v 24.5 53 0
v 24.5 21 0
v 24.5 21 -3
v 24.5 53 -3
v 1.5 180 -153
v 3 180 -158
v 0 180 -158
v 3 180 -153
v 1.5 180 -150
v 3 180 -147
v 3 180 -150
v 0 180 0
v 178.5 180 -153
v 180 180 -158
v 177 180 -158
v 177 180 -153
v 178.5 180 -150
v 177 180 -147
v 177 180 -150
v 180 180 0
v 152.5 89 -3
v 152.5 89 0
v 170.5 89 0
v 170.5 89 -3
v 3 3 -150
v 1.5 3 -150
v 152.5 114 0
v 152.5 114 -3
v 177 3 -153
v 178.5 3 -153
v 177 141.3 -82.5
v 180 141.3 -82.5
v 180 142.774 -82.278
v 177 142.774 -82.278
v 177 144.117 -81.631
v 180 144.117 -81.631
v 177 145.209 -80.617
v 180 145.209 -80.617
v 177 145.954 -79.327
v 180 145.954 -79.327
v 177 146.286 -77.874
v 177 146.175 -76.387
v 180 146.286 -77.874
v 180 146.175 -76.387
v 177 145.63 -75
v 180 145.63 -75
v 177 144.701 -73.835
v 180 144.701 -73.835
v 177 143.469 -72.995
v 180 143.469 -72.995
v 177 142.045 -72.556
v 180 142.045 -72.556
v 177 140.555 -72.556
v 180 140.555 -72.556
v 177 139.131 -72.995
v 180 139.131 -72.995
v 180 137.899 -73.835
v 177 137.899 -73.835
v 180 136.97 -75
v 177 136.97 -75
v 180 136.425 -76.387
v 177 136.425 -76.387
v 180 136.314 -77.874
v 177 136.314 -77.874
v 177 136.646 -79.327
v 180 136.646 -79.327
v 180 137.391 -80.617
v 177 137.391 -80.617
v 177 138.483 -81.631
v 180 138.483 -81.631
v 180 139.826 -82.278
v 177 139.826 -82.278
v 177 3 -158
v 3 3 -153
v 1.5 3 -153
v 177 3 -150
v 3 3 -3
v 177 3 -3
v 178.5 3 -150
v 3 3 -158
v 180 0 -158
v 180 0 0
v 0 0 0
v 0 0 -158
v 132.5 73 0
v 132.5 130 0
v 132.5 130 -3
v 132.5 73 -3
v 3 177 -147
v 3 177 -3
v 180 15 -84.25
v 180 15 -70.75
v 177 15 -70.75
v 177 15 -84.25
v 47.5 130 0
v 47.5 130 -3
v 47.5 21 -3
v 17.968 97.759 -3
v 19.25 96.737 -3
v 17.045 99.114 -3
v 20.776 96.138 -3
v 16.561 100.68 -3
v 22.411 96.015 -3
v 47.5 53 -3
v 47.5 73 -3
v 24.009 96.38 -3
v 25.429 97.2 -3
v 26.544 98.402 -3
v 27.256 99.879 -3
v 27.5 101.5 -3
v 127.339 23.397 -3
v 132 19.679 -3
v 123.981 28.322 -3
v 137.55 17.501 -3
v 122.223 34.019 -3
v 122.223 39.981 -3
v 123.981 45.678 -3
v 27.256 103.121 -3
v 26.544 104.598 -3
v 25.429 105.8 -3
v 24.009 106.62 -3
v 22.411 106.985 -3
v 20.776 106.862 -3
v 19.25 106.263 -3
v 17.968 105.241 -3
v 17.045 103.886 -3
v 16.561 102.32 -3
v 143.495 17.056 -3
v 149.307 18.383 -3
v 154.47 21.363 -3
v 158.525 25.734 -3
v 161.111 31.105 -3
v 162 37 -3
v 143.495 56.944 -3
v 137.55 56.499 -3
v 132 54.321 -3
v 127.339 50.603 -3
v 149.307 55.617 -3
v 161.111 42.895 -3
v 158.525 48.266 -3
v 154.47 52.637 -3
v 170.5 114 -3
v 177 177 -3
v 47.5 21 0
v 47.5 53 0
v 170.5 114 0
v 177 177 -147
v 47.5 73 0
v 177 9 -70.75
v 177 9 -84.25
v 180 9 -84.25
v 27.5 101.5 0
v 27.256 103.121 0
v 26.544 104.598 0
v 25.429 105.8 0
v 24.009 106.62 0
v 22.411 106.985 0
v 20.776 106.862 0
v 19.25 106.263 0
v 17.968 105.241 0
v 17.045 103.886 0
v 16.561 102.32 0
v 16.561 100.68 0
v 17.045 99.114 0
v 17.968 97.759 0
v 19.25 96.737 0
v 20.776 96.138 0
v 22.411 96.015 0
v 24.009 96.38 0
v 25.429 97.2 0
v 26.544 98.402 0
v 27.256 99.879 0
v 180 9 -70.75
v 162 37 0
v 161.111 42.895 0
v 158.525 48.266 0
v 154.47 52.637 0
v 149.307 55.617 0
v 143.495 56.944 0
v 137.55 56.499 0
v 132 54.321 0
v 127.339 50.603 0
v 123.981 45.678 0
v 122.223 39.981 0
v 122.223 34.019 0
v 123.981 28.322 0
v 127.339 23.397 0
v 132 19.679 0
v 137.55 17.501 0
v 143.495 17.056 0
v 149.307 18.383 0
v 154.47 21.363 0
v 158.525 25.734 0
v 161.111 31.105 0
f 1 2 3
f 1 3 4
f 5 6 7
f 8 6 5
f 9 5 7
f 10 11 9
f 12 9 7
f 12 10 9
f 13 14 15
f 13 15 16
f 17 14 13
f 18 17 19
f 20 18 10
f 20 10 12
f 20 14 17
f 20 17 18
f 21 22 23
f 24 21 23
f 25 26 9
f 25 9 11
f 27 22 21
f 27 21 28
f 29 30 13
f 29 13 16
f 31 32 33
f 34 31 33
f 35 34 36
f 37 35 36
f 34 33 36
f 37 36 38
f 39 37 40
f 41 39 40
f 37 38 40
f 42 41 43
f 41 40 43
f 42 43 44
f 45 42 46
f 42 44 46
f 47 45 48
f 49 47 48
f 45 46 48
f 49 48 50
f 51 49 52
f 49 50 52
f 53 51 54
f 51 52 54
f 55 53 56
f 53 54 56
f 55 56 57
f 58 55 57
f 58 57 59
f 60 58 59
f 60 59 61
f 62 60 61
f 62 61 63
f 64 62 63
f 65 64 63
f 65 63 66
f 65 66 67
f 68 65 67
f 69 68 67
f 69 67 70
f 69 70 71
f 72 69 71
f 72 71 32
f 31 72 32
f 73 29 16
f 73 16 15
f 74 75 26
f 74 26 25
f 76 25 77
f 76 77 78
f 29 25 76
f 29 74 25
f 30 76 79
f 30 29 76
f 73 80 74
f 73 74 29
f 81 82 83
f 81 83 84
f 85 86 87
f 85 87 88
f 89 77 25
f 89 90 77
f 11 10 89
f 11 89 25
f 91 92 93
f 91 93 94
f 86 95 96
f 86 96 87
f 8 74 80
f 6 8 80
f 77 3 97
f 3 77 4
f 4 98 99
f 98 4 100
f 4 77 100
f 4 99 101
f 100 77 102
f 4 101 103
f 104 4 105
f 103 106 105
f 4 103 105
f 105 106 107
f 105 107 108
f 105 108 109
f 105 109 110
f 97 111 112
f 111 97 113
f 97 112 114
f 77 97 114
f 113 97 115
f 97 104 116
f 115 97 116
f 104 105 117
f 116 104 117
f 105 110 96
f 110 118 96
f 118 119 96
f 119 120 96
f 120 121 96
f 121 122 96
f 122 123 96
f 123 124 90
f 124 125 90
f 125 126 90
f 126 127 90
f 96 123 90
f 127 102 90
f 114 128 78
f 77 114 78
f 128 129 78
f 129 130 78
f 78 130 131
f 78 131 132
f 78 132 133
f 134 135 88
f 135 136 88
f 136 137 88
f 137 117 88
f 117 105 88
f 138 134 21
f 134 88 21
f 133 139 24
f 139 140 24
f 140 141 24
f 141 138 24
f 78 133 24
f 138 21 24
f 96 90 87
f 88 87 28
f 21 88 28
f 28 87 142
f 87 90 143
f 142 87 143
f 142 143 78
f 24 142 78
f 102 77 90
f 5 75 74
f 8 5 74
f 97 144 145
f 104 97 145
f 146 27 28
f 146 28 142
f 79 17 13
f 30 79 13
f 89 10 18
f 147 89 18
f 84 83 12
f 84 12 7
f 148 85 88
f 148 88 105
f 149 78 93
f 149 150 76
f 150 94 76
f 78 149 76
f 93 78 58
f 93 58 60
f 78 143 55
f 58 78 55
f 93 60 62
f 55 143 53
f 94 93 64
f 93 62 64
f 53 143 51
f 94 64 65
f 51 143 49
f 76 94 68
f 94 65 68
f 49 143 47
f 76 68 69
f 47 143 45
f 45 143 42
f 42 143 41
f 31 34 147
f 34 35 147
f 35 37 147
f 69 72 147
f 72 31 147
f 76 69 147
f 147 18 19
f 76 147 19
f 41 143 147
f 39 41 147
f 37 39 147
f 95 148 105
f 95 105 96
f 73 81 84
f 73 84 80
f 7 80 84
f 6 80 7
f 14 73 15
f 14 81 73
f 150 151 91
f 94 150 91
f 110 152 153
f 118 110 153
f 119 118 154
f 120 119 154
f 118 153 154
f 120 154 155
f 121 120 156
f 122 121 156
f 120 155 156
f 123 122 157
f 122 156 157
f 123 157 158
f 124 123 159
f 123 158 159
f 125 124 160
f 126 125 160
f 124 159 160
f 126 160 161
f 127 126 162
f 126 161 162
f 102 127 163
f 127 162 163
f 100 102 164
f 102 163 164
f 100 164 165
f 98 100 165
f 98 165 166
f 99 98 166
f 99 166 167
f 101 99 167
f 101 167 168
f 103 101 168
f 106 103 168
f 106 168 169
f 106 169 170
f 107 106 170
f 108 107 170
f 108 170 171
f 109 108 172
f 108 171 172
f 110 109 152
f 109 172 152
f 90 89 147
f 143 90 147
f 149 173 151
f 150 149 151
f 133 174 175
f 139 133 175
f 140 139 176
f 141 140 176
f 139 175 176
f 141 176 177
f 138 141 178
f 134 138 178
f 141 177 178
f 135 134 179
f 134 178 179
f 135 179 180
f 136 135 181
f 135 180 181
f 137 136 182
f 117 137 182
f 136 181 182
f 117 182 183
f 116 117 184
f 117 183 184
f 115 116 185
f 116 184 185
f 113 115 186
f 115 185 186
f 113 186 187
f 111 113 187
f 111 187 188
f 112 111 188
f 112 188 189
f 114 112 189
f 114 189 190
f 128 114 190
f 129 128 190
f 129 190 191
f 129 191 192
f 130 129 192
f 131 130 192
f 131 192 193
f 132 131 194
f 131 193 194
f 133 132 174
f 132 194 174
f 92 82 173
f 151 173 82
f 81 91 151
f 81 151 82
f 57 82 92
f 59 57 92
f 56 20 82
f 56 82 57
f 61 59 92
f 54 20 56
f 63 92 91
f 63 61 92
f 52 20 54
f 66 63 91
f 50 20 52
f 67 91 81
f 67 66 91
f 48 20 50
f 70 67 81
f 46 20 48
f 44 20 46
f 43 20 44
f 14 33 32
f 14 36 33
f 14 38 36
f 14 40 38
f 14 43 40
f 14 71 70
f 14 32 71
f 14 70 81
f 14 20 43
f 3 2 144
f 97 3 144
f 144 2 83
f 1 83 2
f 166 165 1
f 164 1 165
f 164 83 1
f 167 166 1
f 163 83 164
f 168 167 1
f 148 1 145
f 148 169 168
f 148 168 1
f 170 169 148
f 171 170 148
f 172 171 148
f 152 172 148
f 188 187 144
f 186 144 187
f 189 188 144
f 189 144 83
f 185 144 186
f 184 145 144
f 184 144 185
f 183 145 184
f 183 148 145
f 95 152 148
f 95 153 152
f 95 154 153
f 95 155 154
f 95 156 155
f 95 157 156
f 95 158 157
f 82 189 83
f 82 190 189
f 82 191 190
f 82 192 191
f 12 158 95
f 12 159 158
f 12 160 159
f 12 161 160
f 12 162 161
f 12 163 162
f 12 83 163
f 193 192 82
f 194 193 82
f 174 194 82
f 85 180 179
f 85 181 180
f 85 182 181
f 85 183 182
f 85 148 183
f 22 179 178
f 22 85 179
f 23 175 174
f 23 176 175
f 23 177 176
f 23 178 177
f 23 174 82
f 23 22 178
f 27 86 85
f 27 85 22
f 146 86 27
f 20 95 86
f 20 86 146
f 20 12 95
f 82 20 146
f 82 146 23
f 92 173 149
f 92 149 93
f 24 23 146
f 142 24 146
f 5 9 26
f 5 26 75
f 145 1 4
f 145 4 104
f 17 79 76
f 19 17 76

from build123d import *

# Parameters (mm, degrees)
SKETCH2_W           = 23
SKETCH2_H           = 32
SKETCH2_R           = 5.5
SKETCH2_R_2         = 20
SKETCH2_W_2         = 18
SKETCH2_H_2         = 25
BOSS_EXTRUDE1_DEPTH = 3
BOSS_EXTRUDE2_DEPTH = 3
SKETCH4_W           = 180
SKETCH4_H           = 158
BOSS_EXTRUDE3_DEPTH = 3
SKETCH6_W           = 1.5
SKETCH6_H           = 3
CUT_EXTRUDE4_DEPTH  = 177
SKETCH8_W           = 180
SKETCH8_H           = 147
BOSS_EXTRUDE5_DEPTH = 3
SKETCH9_R           = 5
SKETCH9_W           = 13.5
SKETCH9_H           = 6
CUT_EXTRUDE5_DEPTH  = 10


with BuildPart() as part:
    # Sketch2 → Boss-Extrude1 (new body)
    # profile 1 of 2: a face of its own
    with BuildSketch(Plane.XY):
        Polygon((90, 180), (0, 180), (0, 130), (0, 0), (90, 0), (90, 73), (47.5, 73), (47.5, 130), (90, 130), align=None)
        with Locations((36, 37)):
            Rectangle(SKETCH2_W, SKETCH2_H, mode=Mode.SUBTRACT)
        with Locations((22, 101.5)):
            Circle(SKETCH2_R, mode=Mode.SUBTRACT)
    # profile 2 of 2: a face of its own
    with BuildSketch(Plane.XY):
        Polygon((180, 180), (90, 180), (90, 130), (132.5, 130), (132.5, 73), (90, 73), (90, 0), (180, 0), align=None)
        with Locations((142, 37)):
            Circle(SKETCH2_R_2, mode=Mode.SUBTRACT)
        with Locations((161.5, 101.5)):
            Rectangle(SKETCH2_W_2, SKETCH2_H_2, mode=Mode.SUBTRACT)
    extrude(amount=-BOSS_EXTRUDE1_DEPTH)

    # Sketch3 → Boss-Extrude2 (add)
    with BuildSketch(Plane(origin=(0, 0, 0), x_dir=(0, 0, -1), z_dir=(1, 0, 0))):
        Polygon((158, 180), (3, 180), (3, 90), (3, 0), (50, 0), (158, 0), align=None)
    boss_extrude2 = extrude(amount=BOSS_EXTRUDE2_DEPTH)

    # Mirror1: Boss-Extrude2 across plane
    add(boss_extrude2.mirror(Plane(origin=(90, 0, 0), x_dir=(0, 0, 1), z_dir=(1, 0, 0))))

    # Sketch4 → Boss-Extrude3 (add)
    with BuildSketch(Plane(origin=(0, 0, 0), x_dir=(1, 0, 0), z_dir=(0, 1, 0))):
        with Locations((90, 79)):
            Rectangle(SKETCH4_W, SKETCH4_H)
    extrude(amount=BOSS_EXTRUDE3_DEPTH)

    # Sketch6 → Cut-Extrude4 (cut)
    with BuildSketch(Plane(origin=(0, 180, 0), x_dir=(1, 0, 0), z_dir=(0, 1, 0))):
        with Locations((2.25, 151.5)):
            Rectangle(SKETCH6_W, SKETCH6_H)
    cut_extrude4 = extrude(amount=-CUT_EXTRUDE4_DEPTH, mode=Mode.SUBTRACT)

    # Mirror2: Cut-Extrude4 across plane
    add(cut_extrude4.mirror(Plane(origin=(90, 0, 0), x_dir=(0, 0, 1), z_dir=(1, 0, 0))), mode=Mode.SUBTRACT)

    # Sketch8 → Boss-Extrude5 (add)
    with BuildSketch(Plane(origin=(0, 180, 0), x_dir=(1, 0, 0), z_dir=(0, 1, 0))):
        with Locations((90, 73.5)):
            Rectangle(SKETCH8_W, SKETCH8_H)
    extrude(amount=-BOSS_EXTRUDE5_DEPTH)

    # Sketch9 → Cut-Extrude5 (cut)
    with BuildSketch(Plane(origin=(180, 0, 0), x_dir=(0, 0, -1), z_dir=(1, 0, 0))):
        with Locations((77.5, 141.3)):
            Circle(SKETCH9_R)
        with Locations((77.5, 12)):
            Rectangle(SKETCH9_W, SKETCH9_H)
    extrude(amount=-CUT_EXTRUDE5_DEPTH, mode=Mode.SUBTRACT)


solid = part.part
